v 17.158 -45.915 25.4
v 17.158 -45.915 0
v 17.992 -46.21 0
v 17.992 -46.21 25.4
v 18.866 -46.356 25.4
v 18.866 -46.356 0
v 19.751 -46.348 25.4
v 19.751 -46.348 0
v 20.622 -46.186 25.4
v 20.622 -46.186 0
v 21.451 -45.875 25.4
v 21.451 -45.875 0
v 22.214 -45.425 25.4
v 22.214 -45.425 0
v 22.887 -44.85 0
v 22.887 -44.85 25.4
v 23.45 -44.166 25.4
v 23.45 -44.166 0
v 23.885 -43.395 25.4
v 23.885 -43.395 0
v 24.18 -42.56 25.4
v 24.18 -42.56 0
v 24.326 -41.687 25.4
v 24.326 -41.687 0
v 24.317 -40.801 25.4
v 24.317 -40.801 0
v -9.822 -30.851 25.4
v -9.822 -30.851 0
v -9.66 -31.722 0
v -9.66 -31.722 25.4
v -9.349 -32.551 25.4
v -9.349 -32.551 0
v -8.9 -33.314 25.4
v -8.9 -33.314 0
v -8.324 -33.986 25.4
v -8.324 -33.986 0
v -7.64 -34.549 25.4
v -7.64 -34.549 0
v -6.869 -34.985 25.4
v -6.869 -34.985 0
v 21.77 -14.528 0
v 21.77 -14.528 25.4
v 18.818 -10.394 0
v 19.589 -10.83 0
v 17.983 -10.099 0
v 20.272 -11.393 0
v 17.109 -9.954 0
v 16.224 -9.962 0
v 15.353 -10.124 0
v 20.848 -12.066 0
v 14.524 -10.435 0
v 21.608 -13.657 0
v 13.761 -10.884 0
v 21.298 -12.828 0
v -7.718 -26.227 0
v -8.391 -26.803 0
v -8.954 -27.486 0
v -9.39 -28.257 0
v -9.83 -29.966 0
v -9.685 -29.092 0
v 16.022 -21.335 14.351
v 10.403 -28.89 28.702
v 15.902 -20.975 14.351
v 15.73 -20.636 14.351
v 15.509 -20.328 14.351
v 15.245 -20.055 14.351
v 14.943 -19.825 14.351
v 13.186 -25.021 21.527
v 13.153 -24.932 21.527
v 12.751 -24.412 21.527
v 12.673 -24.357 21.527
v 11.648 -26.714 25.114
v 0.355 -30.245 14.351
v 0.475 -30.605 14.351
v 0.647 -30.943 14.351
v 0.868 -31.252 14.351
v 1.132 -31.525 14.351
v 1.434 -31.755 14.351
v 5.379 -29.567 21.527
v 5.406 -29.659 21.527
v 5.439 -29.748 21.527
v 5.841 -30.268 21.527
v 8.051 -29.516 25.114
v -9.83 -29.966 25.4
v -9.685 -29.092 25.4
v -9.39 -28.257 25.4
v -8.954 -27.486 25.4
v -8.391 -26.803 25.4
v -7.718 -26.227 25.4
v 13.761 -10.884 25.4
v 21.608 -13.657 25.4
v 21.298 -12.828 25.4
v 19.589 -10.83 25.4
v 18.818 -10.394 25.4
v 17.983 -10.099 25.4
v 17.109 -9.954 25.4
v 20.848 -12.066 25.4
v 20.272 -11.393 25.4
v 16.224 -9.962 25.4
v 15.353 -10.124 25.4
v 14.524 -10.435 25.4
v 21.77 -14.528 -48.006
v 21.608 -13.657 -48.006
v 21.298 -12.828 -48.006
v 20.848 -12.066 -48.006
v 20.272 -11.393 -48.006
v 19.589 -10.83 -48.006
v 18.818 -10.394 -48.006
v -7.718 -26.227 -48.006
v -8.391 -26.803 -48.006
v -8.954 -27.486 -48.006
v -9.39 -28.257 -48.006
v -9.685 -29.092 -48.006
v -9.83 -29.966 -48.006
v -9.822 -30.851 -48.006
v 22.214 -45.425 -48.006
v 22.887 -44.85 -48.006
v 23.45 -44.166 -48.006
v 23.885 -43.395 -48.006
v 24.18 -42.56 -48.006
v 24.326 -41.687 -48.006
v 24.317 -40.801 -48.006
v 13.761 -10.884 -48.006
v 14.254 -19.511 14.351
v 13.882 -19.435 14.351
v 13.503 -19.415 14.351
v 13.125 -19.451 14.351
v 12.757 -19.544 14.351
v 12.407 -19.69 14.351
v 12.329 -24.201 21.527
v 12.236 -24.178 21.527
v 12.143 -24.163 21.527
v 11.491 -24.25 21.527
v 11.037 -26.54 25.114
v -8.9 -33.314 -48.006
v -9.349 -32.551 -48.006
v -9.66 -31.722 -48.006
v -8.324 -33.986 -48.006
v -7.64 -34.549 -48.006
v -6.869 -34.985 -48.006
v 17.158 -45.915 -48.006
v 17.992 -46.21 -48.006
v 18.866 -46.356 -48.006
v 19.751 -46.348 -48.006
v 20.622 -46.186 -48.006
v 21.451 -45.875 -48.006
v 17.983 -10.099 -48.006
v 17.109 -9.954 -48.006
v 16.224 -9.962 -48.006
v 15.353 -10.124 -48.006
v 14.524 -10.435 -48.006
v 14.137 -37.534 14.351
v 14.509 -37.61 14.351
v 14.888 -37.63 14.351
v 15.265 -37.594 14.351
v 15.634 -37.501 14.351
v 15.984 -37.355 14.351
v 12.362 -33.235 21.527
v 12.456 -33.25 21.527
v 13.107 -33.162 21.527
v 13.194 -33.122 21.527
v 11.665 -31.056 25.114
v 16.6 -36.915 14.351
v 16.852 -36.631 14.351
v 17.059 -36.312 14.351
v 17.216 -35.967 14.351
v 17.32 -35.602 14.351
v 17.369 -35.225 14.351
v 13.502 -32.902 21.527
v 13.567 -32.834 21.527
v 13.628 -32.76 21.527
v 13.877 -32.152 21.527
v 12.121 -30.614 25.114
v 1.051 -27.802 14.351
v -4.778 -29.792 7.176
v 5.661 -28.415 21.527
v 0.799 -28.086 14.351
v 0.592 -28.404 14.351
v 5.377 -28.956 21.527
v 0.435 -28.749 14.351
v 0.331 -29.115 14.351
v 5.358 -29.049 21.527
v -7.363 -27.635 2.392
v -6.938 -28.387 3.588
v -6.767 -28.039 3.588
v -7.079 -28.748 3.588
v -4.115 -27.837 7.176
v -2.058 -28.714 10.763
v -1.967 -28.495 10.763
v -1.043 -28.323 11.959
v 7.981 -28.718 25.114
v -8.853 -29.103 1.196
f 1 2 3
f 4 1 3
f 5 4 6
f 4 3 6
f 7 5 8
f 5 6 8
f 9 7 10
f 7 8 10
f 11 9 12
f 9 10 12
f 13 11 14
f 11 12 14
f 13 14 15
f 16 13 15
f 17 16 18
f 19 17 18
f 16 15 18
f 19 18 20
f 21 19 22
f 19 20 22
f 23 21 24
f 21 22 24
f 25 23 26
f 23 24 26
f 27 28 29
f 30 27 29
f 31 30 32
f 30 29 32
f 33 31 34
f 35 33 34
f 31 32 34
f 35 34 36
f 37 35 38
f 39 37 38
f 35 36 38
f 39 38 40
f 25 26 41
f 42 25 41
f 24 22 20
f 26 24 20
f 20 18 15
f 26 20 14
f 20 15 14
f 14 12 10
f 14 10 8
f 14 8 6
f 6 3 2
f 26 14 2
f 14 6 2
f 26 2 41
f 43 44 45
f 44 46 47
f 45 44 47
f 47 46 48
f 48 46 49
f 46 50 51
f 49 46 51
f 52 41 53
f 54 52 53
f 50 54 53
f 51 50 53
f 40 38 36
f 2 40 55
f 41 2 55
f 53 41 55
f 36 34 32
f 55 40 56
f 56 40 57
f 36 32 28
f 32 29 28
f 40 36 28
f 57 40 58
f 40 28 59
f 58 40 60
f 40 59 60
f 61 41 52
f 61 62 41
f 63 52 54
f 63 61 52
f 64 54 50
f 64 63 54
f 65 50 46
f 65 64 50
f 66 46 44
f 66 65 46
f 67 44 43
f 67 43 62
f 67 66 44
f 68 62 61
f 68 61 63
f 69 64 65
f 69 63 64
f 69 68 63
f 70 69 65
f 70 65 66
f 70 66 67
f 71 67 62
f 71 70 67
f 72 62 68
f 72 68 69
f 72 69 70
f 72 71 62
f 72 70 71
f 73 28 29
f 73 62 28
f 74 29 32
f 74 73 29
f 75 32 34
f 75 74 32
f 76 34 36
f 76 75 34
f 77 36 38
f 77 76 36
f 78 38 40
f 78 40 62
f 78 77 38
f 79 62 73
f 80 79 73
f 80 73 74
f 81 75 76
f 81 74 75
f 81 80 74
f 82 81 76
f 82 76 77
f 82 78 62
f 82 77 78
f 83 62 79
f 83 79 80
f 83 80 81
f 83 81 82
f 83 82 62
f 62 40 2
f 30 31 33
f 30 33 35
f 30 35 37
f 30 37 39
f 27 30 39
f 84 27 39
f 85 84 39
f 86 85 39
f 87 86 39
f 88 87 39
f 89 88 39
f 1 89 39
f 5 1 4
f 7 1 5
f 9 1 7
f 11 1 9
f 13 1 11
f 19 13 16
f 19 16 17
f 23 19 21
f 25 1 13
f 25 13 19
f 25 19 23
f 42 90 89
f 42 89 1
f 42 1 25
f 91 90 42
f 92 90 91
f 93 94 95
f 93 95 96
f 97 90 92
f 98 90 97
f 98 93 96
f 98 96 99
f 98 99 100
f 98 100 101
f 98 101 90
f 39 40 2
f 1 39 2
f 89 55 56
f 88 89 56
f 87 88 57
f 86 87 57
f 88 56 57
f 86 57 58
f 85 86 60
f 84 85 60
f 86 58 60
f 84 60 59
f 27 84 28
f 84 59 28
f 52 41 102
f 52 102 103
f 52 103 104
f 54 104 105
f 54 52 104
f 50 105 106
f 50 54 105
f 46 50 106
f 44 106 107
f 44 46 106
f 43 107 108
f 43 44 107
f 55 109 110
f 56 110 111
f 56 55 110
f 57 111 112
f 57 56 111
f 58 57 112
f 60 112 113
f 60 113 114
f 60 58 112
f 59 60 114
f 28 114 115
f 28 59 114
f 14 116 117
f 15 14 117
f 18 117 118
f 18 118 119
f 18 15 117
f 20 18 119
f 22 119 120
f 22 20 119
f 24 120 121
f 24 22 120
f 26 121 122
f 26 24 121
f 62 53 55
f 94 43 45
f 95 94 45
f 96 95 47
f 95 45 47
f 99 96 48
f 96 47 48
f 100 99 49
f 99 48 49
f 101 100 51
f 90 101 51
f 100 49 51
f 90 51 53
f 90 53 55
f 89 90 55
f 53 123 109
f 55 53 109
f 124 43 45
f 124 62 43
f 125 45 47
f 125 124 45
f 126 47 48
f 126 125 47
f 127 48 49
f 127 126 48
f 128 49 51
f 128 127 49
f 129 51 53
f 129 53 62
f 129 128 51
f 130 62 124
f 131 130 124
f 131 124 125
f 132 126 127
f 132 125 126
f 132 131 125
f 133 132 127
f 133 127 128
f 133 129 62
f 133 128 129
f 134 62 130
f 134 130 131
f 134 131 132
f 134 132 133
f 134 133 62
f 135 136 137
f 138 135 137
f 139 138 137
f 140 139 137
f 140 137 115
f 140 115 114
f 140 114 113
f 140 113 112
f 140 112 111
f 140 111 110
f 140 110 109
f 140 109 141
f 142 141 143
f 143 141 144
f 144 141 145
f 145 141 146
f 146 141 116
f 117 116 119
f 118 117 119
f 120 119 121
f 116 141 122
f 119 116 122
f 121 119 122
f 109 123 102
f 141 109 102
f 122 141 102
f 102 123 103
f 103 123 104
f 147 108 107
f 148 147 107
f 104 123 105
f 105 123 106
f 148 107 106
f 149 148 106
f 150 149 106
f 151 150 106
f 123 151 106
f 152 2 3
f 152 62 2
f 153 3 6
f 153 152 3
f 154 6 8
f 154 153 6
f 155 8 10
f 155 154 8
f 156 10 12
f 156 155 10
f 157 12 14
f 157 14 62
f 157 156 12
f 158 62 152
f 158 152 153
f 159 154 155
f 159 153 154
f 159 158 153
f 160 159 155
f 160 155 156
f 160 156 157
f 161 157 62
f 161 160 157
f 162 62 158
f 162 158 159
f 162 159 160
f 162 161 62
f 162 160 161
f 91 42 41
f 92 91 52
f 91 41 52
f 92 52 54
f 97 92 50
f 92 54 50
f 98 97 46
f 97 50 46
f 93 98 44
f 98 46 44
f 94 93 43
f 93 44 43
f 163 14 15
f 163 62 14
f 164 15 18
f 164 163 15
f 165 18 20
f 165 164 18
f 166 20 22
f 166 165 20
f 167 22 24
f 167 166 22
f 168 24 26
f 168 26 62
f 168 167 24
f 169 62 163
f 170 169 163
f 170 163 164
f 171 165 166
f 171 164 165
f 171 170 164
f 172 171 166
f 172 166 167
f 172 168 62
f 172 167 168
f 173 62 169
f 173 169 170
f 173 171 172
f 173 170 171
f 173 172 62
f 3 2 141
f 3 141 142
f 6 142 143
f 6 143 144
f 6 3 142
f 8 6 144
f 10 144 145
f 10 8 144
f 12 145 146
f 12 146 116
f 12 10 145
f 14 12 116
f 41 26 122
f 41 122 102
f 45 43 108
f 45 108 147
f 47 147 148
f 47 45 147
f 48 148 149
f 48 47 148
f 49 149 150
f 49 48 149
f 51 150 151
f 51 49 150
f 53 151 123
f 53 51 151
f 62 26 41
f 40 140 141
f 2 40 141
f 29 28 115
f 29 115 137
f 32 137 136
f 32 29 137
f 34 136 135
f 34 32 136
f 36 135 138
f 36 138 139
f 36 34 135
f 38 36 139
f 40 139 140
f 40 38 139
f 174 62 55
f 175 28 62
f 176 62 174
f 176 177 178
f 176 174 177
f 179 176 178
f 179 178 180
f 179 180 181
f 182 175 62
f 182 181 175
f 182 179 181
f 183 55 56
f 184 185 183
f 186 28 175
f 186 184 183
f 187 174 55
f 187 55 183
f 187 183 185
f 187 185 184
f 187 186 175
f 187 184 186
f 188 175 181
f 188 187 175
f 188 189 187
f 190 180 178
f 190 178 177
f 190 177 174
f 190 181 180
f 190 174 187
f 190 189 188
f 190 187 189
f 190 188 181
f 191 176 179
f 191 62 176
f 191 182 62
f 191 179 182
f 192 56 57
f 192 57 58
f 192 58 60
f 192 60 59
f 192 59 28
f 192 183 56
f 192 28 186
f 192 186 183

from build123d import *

# Parameters (mm, degrees)
F4_DEPTH      = 48.006
F4_DEPTH_BACK = 25.4


# Not quite as in the source:
# - a feature of the source that left no trace in its solid (it failed there, or was rolled back) is left out


with BuildPart() as f3:
    # F0 (on Top) → F3 section 0
    with BuildSketch(Plane.XY, mode=Mode.PRIVATE) as f3_s0:
        with BuildLine():
            Line((13.7612214115, -10.8844338036), (-7.7184564891, -26.2270619124))
            ThreePointArc((-7.7184564891, -26.2270619124), (-9.3897541869, -28.2572270517), (-9.8220576348, -30.8510505261))
            ThreePointArc((-9.8220576348, -30.8510505261), (-8.8995319922, -33.3135184001), (-6.8693675716, -34.9848155062))
            Line((-6.8693675716, -34.9848155062), (17.1575770817, -45.9154481789))
            ThreePointArc((17.1575770817, -45.9154481789), (19.7514000081, -46.347751922), (22.2138684317, -45.4252264958))
            ThreePointArc((22.2138684317, -45.4252264958), (23.8851659635, -43.3950617882), (24.3174697153, -40.8012388093))
            Line((24.3174697153, -40.8012388093), (21.7702029626, -14.5279780279))
            ThreePointArc((21.7702029626, -14.5279780279), (20.8476777597, -12.0655099404), (18.8175135976, -10.3942124484))
            ThreePointArc((18.8175135976, -10.3942124484), (16.2236902852, -9.9619083061), (13.7612214115, -10.8844338036))
        make_face()
    loft([f3_s0.sketch, Vertex(10.4031078517, -28.8901627064, 28.702)])


with BuildPart() as f4:
    # F0 (on Top) → F4 (new body, two sides)
    with BuildSketch(Plane.XY) as f4_sk:
        with BuildLine():
            Line((13.7612214115, -10.8844338036), (-7.7184564891, -26.2270619124))
            ThreePointArc((-7.7184564891, -26.2270619124), (-9.3897541869, -28.2572270517), (-9.8220576348, -30.8510505261))
            ThreePointArc((-9.8220576348, -30.8510505261), (-8.8995319922, -33.3135184001), (-6.8693675716, -34.9848155062))
            Line((-6.8693675716, -34.9848155062), (17.1575770817, -45.9154481789))
            ThreePointArc((17.1575770817, -45.9154481789), (19.7514000081, -46.347751922), (22.2138684317, -45.4252264958))
            ThreePointArc((22.2138684317, -45.4252264958), (23.8851659635, -43.3950617882), (24.3174697153, -40.8012388093))
            Line((24.3174697153, -40.8012388093), (21.7702029626, -14.5279780279))
            ThreePointArc((21.7702029626, -14.5279780279), (20.8476777597, -12.0655099404), (18.8175135976, -10.3942124484))
            ThreePointArc((18.8175135976, -10.3942124484), (16.2236902852, -9.9619083061), (13.7612214115, -10.8844338036))
        make_face()
    extrude(amount=-F4_DEPTH)
    extrude(f4_sk.sketch, amount=F4_DEPTH_BACK)


solid = Compound([f3.part, f4.part])
